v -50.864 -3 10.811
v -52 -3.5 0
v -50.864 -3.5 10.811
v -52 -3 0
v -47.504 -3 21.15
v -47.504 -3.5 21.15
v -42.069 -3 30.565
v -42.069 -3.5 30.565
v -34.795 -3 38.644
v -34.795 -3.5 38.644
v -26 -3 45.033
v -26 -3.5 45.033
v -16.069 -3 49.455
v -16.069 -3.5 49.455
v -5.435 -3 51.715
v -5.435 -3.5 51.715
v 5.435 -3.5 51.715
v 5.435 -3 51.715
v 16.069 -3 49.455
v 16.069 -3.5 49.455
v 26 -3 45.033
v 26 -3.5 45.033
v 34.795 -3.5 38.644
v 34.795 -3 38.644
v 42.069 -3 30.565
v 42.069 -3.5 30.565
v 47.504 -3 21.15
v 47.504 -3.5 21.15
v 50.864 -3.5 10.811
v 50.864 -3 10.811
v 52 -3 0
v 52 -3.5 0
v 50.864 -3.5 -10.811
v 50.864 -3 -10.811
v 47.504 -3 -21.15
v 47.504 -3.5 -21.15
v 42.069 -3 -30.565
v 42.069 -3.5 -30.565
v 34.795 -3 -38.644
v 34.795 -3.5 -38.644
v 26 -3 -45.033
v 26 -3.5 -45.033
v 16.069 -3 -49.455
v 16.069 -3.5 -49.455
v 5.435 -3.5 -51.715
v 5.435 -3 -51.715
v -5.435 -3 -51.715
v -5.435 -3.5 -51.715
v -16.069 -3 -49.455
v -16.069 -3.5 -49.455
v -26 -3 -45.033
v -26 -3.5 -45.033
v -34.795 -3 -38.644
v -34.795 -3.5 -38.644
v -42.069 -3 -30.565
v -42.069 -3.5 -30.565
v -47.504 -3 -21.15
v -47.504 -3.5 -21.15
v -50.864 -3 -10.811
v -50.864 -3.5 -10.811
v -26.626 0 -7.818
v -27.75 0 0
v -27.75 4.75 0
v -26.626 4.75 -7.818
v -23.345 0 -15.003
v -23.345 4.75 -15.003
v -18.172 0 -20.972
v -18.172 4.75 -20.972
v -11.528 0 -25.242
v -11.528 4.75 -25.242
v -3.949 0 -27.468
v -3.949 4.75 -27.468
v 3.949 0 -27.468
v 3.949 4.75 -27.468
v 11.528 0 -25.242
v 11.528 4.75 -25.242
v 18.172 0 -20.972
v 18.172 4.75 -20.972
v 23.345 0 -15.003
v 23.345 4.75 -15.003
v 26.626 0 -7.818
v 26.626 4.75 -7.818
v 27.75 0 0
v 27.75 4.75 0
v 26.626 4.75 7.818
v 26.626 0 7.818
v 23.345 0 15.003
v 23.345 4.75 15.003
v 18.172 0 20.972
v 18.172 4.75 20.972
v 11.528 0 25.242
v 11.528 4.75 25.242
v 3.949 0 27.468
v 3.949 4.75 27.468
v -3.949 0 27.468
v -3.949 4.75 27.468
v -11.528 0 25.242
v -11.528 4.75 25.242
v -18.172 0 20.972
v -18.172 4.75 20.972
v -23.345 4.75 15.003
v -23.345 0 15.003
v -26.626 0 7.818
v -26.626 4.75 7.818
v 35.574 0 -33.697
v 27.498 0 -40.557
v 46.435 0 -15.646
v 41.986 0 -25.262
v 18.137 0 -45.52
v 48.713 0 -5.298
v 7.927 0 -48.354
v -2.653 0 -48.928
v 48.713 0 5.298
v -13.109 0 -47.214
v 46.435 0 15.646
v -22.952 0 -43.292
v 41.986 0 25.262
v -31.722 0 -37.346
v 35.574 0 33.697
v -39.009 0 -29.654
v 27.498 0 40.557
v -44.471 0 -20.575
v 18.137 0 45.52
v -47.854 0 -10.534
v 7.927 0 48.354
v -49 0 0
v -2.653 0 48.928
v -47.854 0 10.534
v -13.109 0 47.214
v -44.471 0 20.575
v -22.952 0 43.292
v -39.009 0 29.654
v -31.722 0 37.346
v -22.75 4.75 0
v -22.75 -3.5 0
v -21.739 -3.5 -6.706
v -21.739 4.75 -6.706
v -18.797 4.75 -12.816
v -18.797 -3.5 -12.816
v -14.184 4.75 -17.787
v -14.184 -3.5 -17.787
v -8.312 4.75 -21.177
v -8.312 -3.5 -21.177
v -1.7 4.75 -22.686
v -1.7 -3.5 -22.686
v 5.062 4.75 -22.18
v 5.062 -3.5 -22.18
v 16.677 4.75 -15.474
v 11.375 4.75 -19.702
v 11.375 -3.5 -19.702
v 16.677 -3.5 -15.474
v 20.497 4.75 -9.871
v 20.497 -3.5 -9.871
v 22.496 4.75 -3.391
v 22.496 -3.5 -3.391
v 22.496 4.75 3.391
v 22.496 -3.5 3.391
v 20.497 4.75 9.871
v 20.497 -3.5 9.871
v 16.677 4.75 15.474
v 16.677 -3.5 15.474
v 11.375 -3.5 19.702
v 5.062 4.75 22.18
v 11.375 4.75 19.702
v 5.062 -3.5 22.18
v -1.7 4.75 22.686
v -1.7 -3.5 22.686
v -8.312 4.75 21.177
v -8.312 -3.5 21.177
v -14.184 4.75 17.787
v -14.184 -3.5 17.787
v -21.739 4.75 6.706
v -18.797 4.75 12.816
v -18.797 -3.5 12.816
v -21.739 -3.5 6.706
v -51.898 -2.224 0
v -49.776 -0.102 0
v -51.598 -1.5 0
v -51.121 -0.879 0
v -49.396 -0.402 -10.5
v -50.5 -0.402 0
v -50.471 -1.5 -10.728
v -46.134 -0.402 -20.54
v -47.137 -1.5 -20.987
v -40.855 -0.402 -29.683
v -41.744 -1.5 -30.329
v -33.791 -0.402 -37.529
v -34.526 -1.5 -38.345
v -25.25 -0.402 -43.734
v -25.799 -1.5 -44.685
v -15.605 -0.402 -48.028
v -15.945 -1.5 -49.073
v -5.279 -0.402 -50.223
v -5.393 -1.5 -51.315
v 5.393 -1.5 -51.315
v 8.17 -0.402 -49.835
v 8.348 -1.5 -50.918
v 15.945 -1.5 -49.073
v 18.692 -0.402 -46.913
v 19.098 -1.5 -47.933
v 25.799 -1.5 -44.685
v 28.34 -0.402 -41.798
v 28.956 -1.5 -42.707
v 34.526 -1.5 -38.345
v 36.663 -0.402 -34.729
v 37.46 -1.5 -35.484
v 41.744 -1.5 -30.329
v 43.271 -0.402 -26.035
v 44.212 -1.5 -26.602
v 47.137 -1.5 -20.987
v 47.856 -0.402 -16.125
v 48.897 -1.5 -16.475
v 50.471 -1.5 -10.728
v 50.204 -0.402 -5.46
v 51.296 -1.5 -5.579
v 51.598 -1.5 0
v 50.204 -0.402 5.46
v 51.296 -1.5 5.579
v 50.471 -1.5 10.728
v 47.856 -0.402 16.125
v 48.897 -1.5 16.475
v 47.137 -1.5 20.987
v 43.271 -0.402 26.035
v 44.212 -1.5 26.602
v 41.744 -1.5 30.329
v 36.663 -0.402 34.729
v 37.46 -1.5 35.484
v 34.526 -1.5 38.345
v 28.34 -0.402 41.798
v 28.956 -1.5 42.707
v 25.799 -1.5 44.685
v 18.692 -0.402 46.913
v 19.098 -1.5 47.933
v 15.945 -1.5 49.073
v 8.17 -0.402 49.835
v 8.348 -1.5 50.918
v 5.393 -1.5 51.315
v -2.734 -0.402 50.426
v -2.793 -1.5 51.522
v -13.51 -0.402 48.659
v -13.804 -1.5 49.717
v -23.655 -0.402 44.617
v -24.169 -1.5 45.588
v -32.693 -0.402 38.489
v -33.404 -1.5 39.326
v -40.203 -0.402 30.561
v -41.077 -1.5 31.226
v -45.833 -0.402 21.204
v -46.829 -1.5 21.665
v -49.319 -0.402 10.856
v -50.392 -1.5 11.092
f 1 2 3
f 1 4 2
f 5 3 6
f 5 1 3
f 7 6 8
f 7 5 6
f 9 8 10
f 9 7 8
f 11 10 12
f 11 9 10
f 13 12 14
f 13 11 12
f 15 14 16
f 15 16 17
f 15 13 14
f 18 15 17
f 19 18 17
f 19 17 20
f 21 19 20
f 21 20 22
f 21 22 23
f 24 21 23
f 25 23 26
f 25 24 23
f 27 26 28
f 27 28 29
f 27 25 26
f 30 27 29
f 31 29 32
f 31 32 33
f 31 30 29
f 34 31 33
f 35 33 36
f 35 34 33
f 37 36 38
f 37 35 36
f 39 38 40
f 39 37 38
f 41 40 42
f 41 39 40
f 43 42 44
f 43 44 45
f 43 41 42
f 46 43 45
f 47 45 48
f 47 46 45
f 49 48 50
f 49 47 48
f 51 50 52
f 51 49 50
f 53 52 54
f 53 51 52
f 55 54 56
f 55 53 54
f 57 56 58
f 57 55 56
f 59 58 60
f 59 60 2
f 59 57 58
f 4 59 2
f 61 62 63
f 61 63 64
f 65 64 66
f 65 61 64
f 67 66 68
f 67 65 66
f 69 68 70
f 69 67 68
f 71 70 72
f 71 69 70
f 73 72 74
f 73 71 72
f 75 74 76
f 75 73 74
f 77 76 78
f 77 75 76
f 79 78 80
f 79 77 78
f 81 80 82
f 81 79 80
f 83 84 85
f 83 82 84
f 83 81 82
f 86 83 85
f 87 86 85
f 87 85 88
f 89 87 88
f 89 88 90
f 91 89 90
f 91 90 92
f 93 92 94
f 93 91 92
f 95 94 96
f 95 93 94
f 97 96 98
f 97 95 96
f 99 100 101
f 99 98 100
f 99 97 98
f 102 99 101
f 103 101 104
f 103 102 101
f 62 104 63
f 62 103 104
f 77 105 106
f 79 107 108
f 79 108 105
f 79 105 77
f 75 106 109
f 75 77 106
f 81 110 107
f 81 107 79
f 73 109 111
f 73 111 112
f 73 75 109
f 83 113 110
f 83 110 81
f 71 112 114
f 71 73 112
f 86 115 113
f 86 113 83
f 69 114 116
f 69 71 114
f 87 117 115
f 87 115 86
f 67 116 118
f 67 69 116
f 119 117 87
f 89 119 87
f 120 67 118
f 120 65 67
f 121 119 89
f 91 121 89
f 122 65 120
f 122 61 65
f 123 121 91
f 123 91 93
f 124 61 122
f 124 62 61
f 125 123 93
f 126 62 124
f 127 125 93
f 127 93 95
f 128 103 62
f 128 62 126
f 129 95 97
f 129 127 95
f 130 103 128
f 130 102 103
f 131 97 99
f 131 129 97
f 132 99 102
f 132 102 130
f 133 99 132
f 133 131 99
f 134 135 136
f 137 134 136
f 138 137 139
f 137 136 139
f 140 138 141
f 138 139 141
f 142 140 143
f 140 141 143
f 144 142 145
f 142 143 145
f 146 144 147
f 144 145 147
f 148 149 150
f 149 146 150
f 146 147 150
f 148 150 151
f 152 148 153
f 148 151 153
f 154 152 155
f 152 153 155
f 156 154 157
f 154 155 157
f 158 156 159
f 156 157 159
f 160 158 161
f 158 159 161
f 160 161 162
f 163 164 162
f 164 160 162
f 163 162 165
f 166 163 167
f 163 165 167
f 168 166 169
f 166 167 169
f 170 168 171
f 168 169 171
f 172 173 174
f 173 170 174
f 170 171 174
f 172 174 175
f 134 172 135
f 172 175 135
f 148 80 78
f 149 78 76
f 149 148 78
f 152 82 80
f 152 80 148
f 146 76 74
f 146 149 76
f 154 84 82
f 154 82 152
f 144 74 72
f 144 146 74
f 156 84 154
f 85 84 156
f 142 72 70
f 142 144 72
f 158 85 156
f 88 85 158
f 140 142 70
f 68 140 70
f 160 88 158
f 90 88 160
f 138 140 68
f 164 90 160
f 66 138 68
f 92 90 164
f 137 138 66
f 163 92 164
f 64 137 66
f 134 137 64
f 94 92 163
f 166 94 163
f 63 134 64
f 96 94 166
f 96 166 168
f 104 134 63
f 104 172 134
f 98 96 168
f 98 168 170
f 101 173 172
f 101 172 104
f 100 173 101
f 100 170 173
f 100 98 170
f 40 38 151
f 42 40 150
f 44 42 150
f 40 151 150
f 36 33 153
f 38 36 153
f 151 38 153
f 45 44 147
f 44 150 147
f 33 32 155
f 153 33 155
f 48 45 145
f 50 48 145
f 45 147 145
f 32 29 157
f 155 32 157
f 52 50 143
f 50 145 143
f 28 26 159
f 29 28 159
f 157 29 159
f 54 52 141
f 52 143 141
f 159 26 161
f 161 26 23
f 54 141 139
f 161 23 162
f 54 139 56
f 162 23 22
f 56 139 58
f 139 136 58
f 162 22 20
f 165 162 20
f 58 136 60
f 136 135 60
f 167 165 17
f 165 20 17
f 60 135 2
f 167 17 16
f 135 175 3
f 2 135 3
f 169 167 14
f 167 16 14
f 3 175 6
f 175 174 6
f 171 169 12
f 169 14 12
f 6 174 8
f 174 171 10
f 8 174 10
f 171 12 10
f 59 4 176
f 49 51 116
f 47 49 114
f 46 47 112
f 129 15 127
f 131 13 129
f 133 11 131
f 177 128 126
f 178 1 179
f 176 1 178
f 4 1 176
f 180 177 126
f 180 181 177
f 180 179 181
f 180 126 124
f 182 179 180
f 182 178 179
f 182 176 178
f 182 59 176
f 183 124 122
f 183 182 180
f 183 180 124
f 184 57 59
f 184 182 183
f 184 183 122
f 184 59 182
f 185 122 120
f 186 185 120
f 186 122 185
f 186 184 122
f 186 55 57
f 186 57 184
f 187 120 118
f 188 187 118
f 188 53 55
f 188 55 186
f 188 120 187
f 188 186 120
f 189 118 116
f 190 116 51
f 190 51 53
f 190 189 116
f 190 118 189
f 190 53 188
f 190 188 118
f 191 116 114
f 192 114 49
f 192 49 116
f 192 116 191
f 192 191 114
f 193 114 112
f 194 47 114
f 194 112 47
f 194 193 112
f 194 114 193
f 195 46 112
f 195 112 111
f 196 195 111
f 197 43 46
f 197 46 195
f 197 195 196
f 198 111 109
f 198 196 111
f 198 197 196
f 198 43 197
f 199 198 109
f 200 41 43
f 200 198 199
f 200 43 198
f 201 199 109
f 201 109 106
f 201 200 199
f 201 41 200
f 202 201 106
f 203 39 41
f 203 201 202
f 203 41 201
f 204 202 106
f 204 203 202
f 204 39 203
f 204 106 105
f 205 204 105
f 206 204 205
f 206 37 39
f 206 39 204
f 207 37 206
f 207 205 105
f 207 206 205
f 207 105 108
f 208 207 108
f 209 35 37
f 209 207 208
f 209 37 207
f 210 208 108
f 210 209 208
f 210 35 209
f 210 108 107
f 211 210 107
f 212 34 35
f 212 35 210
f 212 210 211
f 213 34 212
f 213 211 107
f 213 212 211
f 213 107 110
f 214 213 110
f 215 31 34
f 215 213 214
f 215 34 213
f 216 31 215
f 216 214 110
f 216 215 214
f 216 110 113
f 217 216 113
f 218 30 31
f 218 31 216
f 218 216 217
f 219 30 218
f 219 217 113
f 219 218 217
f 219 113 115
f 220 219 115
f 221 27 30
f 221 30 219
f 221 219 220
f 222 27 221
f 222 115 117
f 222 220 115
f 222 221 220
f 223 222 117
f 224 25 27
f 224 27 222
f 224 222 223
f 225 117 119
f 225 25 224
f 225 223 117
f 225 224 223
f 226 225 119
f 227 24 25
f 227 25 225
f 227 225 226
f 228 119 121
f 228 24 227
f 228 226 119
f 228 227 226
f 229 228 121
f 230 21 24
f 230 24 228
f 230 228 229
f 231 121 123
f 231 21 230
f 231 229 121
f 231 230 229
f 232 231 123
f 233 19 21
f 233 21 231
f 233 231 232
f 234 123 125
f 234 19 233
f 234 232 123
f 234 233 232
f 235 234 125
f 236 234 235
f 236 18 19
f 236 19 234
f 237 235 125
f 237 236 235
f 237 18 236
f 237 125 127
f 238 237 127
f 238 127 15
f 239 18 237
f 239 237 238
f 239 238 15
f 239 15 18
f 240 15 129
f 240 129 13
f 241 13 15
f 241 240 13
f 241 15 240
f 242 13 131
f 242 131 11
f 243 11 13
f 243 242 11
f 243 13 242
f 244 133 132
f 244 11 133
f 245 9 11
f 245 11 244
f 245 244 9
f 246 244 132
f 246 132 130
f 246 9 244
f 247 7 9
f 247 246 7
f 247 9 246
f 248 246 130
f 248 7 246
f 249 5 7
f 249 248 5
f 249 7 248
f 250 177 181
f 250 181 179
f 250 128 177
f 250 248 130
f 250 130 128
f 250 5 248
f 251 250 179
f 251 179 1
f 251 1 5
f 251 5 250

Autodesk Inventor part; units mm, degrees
ref_plane "YZ Plane" through (0, 0, 0) normal (1, 0, 0) x (0, 1, 0)
ref_plane "XZ Plane" through (0, 0, 0) normal (0, 1, 0) x (-1, 0, 0)
ref_plane "XY Plane" through (0, 0, 0) normal (0, 0, 1) x (1, 0, 0)
sketch "Sketch1" plane through (0, 0, 0) normal (0, 1, 0) x (-1, 0, 0)
  circle A0 centre (0, 0) radius 22.75
  circle A1 centre (0, 0) radius 52
  circle A2 centre (0, 0) radius 27.75
  dimension "d0" = 45.5
  dimension "d1" = 104
  dimension "d2" = 55.5
extrude "Extrusion1" add sketch "Sketch1" along normal blind 4.75 contours A2
extrude "Extrusion2" add sketch "Sketch1" against normal blind 3.5 contours A1 | A2
fillet "Fillet1" radius 3 1 edges at (52, 0, 0)
properties part number "motor_chain_guide_center"
